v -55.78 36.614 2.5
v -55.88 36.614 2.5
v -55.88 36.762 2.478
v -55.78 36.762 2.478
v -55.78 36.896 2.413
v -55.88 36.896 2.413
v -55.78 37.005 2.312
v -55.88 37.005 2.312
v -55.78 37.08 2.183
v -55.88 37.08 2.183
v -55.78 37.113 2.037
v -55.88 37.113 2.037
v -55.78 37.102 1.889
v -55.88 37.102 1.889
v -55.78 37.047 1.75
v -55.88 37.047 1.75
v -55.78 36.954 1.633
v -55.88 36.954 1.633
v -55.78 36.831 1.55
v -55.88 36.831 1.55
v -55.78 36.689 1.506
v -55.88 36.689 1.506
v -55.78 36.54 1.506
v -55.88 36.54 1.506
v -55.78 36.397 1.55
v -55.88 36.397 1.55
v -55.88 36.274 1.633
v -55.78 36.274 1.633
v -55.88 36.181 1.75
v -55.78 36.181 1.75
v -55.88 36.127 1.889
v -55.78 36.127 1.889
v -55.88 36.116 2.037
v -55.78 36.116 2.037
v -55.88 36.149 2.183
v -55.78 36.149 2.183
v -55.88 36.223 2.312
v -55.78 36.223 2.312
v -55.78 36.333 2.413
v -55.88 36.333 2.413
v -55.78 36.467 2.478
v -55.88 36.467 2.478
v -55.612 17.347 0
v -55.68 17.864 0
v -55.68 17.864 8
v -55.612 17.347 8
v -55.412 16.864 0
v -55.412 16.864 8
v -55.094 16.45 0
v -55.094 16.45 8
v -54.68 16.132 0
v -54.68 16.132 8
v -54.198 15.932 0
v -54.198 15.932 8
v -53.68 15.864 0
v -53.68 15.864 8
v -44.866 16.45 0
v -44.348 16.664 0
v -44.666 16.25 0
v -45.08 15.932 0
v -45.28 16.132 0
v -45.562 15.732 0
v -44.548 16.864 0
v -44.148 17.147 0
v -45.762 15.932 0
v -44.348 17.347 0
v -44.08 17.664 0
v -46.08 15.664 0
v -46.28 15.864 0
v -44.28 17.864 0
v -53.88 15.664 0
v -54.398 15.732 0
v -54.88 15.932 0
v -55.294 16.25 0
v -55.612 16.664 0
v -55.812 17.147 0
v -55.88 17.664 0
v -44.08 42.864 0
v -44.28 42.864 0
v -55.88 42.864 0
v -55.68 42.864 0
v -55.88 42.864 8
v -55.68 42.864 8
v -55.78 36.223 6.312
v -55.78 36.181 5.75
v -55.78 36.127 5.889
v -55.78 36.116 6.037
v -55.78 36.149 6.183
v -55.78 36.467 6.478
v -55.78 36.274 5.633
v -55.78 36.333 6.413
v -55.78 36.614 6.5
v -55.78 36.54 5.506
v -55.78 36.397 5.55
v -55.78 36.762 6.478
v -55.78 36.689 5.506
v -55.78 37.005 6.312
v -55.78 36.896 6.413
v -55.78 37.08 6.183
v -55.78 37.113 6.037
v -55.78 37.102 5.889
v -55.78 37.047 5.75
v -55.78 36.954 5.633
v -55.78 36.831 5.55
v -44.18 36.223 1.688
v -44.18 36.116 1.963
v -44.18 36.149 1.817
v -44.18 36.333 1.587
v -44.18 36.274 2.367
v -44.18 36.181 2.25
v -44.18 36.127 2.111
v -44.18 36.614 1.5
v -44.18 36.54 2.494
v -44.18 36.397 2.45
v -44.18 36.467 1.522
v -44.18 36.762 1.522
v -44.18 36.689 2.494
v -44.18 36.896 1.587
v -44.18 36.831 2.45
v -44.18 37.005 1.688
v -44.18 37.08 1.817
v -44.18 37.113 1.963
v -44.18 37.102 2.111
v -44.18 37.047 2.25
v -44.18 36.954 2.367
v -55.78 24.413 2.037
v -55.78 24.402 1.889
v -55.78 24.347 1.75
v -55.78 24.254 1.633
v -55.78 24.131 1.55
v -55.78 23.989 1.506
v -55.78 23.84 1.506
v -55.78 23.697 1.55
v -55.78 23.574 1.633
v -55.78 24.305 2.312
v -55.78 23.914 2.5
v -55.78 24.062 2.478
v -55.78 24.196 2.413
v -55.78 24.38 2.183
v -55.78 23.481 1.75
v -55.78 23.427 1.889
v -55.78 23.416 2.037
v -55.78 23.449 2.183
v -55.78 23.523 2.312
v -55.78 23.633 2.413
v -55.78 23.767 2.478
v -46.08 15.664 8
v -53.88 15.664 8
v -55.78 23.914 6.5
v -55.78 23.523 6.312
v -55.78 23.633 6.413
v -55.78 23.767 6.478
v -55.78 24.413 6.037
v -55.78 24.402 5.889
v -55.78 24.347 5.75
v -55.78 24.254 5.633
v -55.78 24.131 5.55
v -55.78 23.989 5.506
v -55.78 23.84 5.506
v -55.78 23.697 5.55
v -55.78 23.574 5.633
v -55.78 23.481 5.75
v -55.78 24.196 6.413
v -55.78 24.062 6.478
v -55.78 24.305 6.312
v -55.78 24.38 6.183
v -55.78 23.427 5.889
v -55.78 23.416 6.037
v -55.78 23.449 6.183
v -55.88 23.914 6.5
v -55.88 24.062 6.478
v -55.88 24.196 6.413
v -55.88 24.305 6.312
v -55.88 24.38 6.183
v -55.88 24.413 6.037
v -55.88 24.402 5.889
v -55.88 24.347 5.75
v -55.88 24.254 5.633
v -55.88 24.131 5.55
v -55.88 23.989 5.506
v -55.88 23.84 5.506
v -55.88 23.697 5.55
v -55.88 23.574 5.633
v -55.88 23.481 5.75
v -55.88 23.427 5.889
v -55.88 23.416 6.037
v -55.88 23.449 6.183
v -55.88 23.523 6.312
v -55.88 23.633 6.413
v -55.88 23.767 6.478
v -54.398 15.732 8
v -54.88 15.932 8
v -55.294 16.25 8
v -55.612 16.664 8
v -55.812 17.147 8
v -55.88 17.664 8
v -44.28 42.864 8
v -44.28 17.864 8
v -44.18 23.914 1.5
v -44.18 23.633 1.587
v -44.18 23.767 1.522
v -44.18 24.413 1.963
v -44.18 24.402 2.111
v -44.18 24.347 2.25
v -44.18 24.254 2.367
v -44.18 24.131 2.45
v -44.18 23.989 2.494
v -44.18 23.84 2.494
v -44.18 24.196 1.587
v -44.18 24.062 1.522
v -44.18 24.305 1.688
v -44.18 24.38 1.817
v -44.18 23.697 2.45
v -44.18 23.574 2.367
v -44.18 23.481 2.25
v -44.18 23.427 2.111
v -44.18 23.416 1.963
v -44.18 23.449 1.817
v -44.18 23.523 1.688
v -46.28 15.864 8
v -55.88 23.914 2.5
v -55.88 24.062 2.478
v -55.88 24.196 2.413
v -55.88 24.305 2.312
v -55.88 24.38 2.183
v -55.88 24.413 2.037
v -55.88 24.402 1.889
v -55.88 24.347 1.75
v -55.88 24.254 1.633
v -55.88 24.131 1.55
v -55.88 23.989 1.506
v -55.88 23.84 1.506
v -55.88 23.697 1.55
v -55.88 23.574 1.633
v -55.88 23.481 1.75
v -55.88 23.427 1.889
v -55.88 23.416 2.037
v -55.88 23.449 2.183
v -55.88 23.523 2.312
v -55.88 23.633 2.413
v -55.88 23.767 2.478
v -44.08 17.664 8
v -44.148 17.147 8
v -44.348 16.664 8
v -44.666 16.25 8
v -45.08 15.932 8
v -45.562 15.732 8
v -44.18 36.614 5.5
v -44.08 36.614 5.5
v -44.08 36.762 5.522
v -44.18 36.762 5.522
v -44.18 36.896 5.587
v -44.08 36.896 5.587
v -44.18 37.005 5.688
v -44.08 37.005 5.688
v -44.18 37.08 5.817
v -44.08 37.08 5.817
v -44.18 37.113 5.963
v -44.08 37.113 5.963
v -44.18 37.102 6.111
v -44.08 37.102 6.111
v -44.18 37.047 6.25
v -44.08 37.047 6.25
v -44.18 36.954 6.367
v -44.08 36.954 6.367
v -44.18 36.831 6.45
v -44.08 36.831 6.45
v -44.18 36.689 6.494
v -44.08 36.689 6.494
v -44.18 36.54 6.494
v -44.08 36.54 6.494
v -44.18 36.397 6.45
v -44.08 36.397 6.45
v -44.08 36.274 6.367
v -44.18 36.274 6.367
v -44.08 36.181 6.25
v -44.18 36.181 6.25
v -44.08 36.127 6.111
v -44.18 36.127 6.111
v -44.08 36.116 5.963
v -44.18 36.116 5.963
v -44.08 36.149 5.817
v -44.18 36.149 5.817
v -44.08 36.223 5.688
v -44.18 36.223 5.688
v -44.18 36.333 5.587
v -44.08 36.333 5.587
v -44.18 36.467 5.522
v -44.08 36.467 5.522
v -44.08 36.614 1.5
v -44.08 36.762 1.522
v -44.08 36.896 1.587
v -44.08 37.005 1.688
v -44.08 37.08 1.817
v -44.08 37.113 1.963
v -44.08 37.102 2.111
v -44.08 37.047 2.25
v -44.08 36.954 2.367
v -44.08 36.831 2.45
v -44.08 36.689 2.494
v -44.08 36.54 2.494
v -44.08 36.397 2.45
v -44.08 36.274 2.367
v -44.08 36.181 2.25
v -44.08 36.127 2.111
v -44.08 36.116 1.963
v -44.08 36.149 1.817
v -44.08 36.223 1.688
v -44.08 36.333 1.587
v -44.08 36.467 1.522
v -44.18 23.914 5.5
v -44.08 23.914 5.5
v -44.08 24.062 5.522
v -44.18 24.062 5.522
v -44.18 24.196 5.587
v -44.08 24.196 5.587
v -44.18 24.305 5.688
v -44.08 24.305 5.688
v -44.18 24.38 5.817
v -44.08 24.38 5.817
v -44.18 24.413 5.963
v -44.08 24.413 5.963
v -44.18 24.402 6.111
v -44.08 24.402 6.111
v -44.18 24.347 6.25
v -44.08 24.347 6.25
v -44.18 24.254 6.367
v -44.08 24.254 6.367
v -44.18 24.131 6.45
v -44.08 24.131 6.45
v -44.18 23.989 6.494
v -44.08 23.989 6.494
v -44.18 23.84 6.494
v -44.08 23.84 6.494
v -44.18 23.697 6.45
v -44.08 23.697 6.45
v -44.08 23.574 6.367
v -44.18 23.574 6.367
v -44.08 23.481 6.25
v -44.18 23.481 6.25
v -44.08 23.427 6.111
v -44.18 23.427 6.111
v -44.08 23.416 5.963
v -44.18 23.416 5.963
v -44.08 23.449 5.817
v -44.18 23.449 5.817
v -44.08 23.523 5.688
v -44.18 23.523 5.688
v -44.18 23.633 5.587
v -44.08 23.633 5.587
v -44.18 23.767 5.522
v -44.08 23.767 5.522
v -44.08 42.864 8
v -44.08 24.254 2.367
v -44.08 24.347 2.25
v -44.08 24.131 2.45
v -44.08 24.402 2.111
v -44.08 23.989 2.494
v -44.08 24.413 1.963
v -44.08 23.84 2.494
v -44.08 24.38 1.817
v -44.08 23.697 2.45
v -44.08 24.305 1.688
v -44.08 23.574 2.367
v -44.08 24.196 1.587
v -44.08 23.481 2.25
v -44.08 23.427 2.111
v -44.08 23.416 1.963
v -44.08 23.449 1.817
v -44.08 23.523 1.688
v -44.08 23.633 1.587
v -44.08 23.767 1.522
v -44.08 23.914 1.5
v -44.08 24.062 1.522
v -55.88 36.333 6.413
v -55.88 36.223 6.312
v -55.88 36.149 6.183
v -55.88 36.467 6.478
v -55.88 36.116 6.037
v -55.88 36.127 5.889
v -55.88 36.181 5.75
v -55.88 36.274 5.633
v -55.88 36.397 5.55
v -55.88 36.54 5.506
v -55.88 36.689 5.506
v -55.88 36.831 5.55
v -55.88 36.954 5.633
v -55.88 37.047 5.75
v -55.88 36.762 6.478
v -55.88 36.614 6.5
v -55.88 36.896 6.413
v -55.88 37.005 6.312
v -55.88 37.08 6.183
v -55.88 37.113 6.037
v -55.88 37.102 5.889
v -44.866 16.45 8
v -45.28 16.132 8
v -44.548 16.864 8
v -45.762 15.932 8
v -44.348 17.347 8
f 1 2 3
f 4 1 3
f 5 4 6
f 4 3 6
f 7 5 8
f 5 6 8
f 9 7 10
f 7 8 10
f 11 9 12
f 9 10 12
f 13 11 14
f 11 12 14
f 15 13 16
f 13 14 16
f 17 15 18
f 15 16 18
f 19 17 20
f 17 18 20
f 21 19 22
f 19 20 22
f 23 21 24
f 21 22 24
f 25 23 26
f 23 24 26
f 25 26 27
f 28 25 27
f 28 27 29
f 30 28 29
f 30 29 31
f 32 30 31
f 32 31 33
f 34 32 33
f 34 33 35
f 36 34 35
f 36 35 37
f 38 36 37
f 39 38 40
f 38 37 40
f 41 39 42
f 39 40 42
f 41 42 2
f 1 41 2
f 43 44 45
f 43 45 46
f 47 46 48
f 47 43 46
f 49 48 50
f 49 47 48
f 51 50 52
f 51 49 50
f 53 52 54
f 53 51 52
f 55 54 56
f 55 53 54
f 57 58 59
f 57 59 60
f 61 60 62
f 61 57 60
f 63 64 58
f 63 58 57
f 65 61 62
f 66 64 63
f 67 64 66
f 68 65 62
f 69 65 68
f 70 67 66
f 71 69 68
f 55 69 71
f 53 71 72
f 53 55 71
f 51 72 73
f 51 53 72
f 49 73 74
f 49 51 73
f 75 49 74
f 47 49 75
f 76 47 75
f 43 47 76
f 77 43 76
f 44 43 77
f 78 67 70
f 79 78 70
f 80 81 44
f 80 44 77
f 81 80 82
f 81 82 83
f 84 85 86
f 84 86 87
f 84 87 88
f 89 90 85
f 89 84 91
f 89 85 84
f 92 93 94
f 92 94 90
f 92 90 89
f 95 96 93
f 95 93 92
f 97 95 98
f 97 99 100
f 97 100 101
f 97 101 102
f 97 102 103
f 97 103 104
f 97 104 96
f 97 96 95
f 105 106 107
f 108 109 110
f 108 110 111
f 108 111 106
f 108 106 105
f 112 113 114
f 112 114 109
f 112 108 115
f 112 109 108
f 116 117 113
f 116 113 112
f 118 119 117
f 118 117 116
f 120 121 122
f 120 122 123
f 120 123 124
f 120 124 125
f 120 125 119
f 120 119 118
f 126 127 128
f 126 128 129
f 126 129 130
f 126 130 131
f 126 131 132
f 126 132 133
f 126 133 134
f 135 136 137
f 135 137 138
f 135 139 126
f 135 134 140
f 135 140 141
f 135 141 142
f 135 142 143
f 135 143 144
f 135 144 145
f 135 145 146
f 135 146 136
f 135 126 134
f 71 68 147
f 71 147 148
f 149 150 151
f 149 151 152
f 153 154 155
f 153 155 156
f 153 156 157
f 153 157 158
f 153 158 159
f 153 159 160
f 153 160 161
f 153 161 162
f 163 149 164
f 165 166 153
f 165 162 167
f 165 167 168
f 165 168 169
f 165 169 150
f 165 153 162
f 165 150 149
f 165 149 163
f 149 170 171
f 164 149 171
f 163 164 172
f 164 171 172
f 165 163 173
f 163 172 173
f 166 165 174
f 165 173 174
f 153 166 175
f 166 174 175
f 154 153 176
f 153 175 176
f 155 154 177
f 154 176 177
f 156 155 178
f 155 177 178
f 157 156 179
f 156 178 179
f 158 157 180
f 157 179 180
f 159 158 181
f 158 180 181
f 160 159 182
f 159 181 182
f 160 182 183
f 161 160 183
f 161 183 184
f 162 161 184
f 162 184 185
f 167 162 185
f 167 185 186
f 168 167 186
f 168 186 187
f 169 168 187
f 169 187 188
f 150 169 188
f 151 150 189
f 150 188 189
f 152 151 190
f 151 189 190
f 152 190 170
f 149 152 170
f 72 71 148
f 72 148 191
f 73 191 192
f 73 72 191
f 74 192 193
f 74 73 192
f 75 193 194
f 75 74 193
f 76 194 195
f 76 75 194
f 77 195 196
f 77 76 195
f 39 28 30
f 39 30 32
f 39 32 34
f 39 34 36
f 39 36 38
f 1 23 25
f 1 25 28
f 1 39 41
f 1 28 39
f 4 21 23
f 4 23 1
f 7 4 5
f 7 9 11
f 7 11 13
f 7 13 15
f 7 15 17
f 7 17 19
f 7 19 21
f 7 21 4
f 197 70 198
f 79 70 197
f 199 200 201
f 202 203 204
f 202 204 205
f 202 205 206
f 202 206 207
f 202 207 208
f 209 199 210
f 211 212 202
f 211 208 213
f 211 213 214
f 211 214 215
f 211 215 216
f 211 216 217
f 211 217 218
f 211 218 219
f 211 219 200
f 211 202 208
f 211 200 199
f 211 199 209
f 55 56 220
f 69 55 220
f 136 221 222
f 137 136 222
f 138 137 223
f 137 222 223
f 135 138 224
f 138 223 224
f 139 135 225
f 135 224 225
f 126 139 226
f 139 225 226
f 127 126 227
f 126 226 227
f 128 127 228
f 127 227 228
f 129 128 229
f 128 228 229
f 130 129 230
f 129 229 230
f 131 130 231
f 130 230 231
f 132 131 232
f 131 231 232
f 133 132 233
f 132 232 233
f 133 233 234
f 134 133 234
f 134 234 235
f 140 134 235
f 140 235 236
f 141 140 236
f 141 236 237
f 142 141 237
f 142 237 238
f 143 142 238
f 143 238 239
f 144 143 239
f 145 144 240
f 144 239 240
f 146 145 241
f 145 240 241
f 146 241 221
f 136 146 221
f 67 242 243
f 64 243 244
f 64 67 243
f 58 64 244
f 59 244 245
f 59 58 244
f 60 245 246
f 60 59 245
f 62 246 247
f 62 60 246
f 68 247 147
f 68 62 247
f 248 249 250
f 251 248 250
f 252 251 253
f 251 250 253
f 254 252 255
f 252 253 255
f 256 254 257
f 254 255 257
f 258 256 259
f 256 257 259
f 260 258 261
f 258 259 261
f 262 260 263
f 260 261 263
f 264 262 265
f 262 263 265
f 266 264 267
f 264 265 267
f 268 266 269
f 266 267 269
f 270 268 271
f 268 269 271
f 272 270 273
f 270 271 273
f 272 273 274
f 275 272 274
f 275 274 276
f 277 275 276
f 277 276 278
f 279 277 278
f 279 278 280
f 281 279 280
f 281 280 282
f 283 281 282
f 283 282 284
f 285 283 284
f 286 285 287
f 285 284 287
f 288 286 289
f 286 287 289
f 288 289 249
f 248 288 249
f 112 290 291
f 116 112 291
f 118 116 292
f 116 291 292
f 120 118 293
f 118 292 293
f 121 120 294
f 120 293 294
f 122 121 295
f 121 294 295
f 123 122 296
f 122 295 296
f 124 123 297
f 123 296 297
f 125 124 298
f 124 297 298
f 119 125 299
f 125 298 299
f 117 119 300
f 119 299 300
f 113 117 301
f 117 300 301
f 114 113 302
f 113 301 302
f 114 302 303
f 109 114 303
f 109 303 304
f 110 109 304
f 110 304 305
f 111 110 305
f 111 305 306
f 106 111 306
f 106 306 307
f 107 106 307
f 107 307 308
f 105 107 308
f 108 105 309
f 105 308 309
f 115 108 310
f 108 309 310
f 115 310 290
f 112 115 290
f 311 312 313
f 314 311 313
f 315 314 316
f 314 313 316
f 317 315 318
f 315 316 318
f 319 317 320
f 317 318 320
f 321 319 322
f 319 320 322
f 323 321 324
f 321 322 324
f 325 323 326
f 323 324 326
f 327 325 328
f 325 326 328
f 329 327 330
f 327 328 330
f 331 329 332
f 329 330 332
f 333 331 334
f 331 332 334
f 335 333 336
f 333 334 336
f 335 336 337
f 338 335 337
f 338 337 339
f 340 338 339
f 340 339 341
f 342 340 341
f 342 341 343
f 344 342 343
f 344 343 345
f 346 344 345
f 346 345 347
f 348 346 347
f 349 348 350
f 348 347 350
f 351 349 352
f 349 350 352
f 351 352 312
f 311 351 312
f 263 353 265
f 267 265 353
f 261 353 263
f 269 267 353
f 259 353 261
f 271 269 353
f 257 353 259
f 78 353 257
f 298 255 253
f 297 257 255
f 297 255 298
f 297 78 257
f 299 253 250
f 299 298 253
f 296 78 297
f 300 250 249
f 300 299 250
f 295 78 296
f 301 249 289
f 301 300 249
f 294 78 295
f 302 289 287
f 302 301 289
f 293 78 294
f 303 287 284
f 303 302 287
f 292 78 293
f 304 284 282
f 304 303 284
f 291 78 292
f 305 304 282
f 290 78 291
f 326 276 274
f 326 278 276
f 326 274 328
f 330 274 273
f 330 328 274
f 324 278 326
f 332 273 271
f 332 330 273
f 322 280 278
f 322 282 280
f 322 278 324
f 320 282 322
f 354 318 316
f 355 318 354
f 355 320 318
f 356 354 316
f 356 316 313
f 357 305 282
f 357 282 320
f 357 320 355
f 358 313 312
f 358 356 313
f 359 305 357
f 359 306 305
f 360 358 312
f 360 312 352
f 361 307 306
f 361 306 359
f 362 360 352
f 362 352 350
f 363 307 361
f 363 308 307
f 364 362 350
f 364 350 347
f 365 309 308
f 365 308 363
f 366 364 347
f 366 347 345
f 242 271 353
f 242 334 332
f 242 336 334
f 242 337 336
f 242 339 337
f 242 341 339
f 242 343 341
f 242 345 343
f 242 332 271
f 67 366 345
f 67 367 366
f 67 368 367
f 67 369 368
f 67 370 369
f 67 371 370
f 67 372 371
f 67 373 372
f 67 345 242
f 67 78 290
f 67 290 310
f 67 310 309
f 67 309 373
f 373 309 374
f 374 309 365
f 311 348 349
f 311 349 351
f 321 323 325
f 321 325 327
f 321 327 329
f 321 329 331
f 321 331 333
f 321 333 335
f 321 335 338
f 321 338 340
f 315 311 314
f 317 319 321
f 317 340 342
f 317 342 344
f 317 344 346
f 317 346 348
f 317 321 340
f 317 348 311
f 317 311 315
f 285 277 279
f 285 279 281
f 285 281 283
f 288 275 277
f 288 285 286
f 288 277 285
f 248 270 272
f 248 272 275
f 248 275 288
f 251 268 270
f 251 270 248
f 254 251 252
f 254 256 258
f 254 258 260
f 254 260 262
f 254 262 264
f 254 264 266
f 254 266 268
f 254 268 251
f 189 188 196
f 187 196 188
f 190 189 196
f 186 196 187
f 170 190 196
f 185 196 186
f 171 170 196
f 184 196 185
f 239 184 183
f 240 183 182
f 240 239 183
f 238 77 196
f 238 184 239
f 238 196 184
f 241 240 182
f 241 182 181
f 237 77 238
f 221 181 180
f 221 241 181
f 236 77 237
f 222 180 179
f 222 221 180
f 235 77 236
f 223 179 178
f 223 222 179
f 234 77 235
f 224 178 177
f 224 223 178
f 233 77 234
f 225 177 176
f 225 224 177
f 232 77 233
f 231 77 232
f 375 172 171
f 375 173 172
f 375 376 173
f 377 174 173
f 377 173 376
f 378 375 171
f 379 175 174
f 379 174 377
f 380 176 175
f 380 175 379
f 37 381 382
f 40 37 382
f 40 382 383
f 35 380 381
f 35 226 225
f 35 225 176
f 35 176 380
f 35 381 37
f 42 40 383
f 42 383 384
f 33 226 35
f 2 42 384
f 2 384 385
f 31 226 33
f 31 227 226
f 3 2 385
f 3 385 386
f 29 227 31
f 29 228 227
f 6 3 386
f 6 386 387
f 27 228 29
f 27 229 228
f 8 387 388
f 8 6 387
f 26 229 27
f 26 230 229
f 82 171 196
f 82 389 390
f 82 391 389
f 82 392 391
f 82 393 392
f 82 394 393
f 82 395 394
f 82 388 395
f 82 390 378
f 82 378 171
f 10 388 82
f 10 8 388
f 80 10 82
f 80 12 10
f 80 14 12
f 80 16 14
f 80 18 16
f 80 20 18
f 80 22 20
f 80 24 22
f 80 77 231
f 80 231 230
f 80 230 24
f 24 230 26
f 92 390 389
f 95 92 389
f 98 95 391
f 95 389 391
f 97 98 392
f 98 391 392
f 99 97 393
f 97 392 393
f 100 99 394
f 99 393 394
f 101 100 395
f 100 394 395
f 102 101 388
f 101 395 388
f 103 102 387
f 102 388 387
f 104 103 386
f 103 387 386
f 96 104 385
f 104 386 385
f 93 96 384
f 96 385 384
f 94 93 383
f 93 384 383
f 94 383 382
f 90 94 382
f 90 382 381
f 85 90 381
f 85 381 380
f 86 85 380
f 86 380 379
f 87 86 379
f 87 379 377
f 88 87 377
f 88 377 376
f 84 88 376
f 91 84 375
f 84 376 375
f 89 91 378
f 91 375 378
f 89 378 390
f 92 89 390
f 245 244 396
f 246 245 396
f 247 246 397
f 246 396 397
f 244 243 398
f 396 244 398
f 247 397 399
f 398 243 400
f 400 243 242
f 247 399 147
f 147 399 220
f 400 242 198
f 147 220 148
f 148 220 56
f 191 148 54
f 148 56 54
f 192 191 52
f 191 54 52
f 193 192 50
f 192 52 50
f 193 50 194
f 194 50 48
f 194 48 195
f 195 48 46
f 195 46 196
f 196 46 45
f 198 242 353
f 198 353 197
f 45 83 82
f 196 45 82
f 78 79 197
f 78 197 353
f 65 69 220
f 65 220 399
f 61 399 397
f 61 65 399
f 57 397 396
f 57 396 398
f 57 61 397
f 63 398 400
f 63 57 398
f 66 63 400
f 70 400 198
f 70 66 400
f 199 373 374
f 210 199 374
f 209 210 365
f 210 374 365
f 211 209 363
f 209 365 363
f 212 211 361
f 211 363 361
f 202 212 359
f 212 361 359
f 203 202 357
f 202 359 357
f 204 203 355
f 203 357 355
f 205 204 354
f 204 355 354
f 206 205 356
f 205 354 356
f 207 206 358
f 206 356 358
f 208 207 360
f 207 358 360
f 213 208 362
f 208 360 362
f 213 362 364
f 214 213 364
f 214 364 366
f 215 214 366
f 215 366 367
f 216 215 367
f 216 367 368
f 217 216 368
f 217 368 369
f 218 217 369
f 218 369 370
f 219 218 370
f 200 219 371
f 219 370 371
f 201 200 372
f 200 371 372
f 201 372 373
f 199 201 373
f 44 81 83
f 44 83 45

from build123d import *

# Parameters (mm, degrees)
DODANIE_WYCI_GNI_CIE1_DEPTH = 8
SZKIC2_R                    = 0.5
WYTNIJ_WYCI_GNI_CIE1_DEPTH  = 0.1
SZKIC3_R                    = 0.5
WYTNIJ_WYCI_GNI_CIE2_DEPTH  = 0.1


with BuildPart() as part:
    # Szkic1 → Dodanie-wyciągnięcie1 (new body)
    with BuildSketch(Plane.XY):
        with BuildLine():
            Line((-55.680131723, 42.864285714), (-55.680131723, 17.864285714))
            ThreePointArc((-55.680131723, 17.864285714), (-55.094345286, 16.450072152), (-53.680131723, 15.864285714))
            Line((-53.680131723, 15.864285714), (-46.280131723, 15.864285714))
            ThreePointArc((-46.280131723, 15.864285714), (-44.865918161, 16.450072152), (-44.280131723, 17.864285714))
            Line((-44.280131723, 17.864285714), (-44.280131723, 42.864285714))
            Line((-44.280131723, 42.864285714), (-44.080131723, 42.864285714))
            Line((-44.080131723, 42.864285714), (-44.080131723, 17.664285714))
            ThreePointArc((-44.080131723, 17.664285714), (-44.665918161, 16.250072152), (-46.080131723, 15.664285714))
            Line((-46.080131723, 15.664285714), (-53.880131723, 15.664285714))
            ThreePointArc((-53.880131723, 15.664285714), (-55.294345286, 16.250072152), (-55.880131723, 17.664285714))
            Line((-55.880131723, 17.664285714), (-55.880131723, 42.864285714))
            Line((-55.880131723, 42.864285714), (-55.680131723, 42.864285714))
        make_face()
    extrude(amount=DODANIE_WYCI_GNI_CIE1_DEPTH)

    # Szkic2 → Wytnij-wyciągnięcie1 (cut)
    with BuildSketch(Plane(origin=(-44.080131723, 0, 0), x_dir=(0, 0, -1), z_dir=(1, 0, 0))):
        with Locations((-2, 36.614285714)):
            Circle(SZKIC2_R)
        with Locations((-6, 36.614285714)):
            Circle(SZKIC2_R)
        with Locations((-6, 23.914285714)):
            Circle(SZKIC2_R)
        with Locations((-2, 23.914285714)):
            Circle(SZKIC2_R)
    extrude(amount=-WYTNIJ_WYCI_GNI_CIE1_DEPTH, mode=Mode.SUBTRACT)

    # Szkic3 → Wytnij-wyciągnięcie2 (cut)
    with BuildSketch(Plane.ZY.offset(55.880131723)):
        with Locations((2, 36.614285714)):
            Circle(SZKIC3_R)
        with Locations((6, 36.614285714)):
            Circle(SZKIC3_R)
        with Locations((6, 23.914285714)):
            Circle(SZKIC3_R)
        with Locations((2, 23.914285714)):
            Circle(SZKIC3_R)
    extrude(amount=-WYTNIJ_WYCI_GNI_CIE2_DEPTH, mode=Mode.SUBTRACT)


solid = part.part
